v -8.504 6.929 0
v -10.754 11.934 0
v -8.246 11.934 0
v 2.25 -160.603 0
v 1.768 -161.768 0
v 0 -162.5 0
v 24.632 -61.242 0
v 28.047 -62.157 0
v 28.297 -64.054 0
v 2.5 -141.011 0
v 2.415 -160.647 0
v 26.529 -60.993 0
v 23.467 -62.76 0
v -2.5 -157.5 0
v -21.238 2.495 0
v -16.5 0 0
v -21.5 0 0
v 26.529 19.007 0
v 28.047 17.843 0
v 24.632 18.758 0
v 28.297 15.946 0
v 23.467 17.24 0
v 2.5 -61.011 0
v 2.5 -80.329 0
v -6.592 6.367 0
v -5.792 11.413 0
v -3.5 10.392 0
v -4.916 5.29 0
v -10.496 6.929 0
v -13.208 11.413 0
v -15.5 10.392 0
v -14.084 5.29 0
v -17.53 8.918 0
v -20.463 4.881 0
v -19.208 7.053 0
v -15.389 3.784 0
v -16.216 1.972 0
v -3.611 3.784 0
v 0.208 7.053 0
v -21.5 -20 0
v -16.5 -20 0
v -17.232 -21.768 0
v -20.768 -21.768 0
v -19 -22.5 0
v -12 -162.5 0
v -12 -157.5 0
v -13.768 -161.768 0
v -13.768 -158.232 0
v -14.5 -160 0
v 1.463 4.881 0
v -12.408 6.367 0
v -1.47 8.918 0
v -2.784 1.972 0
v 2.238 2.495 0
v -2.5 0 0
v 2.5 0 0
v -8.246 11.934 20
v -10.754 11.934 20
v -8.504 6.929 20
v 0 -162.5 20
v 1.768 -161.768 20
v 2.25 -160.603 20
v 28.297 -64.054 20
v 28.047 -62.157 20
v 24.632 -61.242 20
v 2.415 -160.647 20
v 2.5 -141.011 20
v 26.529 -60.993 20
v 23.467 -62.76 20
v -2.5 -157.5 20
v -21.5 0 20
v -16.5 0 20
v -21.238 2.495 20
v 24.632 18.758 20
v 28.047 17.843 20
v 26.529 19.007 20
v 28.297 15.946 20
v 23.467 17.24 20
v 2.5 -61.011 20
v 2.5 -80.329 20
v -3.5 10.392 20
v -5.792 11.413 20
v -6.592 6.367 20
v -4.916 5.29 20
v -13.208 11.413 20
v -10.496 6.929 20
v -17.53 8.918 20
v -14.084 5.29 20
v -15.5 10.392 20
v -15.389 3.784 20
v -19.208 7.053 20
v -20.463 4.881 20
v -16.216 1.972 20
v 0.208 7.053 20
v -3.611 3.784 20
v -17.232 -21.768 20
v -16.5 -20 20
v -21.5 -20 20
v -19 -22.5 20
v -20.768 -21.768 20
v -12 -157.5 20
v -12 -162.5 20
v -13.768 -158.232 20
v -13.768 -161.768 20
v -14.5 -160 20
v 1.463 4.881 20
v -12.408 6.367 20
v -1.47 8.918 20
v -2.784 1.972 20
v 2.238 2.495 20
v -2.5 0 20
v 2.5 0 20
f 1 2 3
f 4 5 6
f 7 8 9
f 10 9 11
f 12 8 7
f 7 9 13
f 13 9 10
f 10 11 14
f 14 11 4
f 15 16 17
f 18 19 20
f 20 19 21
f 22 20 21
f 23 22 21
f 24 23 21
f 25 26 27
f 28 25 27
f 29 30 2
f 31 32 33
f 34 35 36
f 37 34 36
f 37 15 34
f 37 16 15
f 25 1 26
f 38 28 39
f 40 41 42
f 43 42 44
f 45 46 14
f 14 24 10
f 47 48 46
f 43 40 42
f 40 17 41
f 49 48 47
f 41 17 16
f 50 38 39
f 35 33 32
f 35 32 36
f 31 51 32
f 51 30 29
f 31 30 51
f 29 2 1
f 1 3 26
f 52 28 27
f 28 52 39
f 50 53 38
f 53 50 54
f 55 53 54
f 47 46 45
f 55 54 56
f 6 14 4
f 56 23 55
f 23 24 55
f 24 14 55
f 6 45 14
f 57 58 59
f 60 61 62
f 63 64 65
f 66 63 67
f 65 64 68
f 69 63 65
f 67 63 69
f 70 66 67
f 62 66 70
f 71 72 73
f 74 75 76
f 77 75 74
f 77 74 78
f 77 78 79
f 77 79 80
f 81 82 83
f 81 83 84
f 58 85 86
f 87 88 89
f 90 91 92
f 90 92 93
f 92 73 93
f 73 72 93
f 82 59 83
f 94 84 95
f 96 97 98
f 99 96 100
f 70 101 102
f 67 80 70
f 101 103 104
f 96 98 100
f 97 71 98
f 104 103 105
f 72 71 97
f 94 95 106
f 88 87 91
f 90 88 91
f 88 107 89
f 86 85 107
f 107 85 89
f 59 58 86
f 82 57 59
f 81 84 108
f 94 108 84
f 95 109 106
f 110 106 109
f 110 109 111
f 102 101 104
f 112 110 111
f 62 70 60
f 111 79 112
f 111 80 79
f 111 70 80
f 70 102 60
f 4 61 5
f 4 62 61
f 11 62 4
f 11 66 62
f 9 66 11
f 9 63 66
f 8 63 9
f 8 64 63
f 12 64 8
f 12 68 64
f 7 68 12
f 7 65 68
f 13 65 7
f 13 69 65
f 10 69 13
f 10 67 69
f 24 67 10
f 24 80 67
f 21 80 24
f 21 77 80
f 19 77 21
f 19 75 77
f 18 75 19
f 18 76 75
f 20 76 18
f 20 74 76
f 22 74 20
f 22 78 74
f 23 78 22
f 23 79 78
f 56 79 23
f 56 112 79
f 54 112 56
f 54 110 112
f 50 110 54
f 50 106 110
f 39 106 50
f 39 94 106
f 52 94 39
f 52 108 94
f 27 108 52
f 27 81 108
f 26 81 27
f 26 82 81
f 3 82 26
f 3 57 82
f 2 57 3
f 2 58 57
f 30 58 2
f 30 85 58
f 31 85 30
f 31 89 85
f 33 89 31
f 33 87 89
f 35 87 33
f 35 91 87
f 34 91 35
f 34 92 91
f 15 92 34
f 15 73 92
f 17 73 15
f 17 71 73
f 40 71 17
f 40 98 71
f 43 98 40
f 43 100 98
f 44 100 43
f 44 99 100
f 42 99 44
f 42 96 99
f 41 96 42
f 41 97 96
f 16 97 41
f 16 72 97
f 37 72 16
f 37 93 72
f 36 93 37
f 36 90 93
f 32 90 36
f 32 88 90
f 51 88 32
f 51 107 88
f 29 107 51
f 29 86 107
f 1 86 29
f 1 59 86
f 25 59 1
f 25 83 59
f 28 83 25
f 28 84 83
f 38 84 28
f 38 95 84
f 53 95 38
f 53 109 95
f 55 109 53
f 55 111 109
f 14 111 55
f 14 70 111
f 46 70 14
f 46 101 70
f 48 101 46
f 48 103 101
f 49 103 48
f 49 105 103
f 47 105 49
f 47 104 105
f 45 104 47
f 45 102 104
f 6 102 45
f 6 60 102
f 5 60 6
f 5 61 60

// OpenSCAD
r=12; // radius of the outer circle
r2=7; // radius of the inner circle
r3=5; // width of the stick
h=160;
h2 = 100; // height of each branch

linear_extrude(height=20) {
translate([-r2-(r-r2)/2.0, 0]) {
  difference() {
    circle(r, center=true);
    circle(r2, center=true);
    translate([0,-r])square([2*r,2*r], center=true);
  }
  translate([-r2-(r-r2)/2, 0]) {
    translate([0, -(r-r2)*2]) square([(r-r2), (r-r2)*4], center=true);
    translate([0, -(r-r2)*4]) circle((r-r2)/2, center=true);
  }
}

translate([0, -h/2]) {
  square([r3, h], center=true);
  translate([0, h/2]) circle(r3/2);
  translate([-r/2, -h/2]) square([r, r3], center=true);
  translate([-r, -h/2]) circle(r3/2);
  translate([0, -h/2]) circle(r3/2);
}

translate([0, -80])
rotate(-15)
translate([0, h2/2]) {
  translate([0, h2/2]) circle(r3/2, center=true);
  square([r3, h2], center=true);
}

translate([0, -160])
rotate(-15)
translate([0, h2/2]) {
  translate([0, h2/2]) circle(r3/2, center=true);
  square([r3, h2], center=true);
}
}
